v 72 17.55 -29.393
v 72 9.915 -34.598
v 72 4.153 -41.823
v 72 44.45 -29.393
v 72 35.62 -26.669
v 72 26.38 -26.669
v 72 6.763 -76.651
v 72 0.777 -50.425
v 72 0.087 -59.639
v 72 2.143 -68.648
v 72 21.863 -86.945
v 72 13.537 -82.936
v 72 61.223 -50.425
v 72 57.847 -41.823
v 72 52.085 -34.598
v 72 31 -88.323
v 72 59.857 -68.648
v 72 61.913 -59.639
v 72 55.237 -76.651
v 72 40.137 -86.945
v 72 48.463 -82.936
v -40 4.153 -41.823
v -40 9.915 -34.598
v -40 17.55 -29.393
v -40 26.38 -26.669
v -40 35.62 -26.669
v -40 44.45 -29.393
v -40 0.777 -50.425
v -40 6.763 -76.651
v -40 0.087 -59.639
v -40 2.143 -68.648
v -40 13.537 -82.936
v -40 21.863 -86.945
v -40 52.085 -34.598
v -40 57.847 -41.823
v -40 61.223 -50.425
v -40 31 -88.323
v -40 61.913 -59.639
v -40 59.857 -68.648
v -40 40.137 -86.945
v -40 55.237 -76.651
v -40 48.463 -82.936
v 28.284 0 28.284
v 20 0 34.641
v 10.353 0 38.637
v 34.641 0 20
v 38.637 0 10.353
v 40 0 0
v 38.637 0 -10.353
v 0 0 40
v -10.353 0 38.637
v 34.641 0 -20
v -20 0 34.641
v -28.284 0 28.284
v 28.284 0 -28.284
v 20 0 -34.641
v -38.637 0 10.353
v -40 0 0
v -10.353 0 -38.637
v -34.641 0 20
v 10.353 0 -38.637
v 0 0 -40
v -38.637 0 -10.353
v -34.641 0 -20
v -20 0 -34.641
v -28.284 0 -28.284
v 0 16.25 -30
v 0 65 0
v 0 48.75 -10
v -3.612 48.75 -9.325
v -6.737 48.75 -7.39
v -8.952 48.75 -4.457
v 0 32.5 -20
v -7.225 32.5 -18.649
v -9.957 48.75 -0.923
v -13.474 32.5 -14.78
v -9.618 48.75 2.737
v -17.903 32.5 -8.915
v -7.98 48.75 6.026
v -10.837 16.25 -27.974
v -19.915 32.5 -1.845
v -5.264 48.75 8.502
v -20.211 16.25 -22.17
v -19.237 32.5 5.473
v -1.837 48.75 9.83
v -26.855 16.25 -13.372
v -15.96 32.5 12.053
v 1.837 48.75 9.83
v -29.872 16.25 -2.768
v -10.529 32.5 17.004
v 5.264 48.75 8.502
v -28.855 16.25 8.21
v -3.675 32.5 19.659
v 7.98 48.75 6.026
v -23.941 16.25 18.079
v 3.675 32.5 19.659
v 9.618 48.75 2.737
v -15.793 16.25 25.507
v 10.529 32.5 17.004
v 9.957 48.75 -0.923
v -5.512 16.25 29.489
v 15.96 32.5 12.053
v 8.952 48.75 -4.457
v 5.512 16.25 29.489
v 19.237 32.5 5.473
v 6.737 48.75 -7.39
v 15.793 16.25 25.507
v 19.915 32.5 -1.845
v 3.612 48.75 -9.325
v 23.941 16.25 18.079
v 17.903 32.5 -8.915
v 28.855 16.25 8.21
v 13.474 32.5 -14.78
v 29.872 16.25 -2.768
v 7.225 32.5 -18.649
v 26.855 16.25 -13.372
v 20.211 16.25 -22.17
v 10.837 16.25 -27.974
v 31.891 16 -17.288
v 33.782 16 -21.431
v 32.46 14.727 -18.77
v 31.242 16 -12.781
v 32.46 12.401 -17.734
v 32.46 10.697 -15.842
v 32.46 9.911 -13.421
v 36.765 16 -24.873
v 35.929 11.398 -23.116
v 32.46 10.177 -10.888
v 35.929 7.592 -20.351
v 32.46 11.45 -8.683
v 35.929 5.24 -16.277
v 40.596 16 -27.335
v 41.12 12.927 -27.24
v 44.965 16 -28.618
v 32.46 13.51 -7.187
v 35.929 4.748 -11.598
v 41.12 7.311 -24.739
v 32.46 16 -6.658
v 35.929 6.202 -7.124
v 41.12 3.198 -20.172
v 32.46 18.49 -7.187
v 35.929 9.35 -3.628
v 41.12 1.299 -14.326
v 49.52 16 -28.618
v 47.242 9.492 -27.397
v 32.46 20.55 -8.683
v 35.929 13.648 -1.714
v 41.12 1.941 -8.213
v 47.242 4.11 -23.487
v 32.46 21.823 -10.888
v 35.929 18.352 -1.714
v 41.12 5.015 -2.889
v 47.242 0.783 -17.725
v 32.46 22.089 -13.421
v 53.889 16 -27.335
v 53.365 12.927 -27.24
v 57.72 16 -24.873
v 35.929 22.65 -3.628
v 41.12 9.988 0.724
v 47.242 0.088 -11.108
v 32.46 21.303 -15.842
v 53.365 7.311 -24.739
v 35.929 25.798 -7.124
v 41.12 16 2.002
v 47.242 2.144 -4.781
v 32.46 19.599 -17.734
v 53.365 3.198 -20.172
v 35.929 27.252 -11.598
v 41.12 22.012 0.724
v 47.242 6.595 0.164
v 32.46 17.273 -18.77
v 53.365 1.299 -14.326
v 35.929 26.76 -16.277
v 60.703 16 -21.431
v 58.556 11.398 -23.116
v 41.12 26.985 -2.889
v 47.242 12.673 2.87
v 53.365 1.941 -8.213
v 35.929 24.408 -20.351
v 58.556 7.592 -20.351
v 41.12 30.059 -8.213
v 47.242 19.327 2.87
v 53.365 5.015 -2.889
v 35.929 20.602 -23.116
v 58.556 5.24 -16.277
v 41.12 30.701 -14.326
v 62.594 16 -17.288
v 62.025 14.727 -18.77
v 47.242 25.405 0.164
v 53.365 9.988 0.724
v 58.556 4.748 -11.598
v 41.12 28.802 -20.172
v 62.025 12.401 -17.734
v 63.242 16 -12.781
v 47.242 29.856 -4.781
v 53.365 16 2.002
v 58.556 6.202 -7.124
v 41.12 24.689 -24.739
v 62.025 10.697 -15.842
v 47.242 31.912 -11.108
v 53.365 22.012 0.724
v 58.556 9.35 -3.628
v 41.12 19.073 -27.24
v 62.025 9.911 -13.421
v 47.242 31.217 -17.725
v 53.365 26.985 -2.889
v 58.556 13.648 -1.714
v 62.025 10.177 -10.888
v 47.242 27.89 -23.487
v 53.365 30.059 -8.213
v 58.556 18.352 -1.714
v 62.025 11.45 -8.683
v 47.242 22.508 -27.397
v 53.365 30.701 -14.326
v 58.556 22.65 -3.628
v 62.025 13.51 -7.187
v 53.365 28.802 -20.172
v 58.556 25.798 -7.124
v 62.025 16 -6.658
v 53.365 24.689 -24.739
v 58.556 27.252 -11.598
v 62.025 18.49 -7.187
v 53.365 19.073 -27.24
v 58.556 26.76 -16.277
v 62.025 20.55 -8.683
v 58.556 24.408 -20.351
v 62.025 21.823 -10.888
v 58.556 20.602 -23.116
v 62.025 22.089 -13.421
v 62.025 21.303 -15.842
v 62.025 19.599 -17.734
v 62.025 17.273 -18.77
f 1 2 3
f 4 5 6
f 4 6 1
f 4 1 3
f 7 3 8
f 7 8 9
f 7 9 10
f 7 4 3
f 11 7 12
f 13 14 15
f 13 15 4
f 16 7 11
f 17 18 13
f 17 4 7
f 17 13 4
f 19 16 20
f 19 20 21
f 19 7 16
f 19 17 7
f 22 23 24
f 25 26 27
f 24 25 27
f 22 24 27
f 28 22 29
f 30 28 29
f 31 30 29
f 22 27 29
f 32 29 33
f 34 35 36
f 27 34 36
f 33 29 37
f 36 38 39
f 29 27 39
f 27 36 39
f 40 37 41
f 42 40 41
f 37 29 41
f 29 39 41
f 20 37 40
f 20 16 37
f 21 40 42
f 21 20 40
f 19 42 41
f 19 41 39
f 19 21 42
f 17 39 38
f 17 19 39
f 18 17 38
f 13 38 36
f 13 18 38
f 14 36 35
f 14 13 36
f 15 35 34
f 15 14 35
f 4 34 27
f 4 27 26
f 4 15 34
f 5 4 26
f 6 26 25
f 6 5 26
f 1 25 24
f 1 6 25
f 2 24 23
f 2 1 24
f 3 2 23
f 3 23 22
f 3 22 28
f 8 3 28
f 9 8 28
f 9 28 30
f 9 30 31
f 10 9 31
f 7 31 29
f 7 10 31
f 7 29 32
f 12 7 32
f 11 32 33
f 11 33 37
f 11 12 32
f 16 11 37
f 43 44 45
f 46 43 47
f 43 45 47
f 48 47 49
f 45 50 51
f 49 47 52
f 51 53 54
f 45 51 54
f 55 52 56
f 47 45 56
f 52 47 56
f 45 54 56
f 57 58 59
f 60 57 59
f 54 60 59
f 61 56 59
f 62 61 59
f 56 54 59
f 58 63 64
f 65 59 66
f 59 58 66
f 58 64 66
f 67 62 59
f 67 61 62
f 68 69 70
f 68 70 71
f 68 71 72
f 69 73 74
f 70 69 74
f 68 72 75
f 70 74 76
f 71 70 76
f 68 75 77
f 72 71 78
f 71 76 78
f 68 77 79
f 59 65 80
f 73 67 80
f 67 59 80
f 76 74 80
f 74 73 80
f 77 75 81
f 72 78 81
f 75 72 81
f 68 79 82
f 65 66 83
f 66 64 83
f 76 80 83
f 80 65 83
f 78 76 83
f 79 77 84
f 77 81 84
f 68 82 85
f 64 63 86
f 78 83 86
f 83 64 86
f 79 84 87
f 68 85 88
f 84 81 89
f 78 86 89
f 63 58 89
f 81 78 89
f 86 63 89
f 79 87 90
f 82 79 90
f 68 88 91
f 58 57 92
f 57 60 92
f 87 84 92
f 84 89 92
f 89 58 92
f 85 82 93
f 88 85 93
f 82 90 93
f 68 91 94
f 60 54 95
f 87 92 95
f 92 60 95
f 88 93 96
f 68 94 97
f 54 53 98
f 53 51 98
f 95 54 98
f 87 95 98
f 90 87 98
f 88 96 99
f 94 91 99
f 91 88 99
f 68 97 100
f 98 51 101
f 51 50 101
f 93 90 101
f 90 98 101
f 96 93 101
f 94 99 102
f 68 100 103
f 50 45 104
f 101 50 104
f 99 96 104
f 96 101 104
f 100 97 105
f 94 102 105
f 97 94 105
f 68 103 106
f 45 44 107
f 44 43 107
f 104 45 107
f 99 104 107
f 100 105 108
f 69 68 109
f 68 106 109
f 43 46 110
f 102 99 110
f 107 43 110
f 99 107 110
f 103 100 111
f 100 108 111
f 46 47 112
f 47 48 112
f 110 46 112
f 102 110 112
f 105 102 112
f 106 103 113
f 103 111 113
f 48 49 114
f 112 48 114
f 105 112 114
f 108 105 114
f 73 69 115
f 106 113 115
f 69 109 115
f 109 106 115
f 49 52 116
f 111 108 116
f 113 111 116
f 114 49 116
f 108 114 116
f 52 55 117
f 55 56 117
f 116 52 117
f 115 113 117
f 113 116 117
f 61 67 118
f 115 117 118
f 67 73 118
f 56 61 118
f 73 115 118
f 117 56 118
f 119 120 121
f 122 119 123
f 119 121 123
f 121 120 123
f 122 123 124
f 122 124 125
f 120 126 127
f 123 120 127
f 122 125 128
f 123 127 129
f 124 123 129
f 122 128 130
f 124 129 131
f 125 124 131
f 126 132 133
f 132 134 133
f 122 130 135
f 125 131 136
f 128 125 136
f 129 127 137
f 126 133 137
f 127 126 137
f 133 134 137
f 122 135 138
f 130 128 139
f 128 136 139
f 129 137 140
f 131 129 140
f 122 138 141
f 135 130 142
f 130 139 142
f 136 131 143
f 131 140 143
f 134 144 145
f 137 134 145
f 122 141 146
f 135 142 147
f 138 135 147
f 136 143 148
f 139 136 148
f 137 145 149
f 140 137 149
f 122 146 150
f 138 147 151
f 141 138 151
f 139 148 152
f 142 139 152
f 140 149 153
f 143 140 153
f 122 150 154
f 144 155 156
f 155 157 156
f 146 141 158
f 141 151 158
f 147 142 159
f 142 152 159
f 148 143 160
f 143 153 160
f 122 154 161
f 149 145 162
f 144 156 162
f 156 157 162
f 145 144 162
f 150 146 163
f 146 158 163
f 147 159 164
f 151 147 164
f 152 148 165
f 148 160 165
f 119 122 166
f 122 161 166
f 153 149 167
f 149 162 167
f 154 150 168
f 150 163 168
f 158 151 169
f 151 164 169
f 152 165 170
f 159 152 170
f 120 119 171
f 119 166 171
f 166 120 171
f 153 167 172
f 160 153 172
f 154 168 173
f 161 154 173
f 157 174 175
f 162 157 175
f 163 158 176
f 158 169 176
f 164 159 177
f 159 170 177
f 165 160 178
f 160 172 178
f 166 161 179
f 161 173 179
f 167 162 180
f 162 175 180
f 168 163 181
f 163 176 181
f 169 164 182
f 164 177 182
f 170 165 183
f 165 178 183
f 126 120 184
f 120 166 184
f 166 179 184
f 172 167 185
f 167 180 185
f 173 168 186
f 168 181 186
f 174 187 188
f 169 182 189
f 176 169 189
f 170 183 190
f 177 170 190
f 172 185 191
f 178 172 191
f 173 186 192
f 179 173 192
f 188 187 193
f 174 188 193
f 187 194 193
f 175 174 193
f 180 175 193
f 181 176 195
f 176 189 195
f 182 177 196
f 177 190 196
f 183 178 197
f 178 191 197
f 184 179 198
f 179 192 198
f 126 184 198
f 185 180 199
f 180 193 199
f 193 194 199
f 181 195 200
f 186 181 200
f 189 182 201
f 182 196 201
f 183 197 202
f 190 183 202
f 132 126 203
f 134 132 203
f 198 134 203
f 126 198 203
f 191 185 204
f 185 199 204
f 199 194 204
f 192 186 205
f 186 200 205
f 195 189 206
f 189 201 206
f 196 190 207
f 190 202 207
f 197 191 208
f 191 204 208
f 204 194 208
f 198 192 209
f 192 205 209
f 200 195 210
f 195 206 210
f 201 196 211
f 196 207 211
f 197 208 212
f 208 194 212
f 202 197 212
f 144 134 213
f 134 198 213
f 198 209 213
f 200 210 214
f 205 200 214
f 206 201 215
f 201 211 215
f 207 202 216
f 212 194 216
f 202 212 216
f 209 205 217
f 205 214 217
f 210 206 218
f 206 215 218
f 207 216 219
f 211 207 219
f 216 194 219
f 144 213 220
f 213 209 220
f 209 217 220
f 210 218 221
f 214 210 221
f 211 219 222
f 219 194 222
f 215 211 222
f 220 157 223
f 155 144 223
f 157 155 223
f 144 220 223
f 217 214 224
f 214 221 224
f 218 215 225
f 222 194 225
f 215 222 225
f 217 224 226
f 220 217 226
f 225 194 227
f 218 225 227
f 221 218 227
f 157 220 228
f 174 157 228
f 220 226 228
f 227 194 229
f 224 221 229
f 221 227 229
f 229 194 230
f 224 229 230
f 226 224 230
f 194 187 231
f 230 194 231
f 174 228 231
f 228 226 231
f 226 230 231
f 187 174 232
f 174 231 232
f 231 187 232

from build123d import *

# Parameters (mm, degrees)
SKETCH2_R           = 31
EXTRUDE1_DEPTH      = 72
EXTRUDE1_DEPTH_BACK = 40


with BuildPart() as part:
    # Sketch1 → Revolve1 (revolve)
    with BuildSketch(Plane.XY, mode=Mode.PRIVATE) as revolve1_sk:
        Polygon((40, 0), (0, 0), (0, 65), align=None)
    revolve(revolve1_sk.sketch.rotate(Axis((0, 0, 0), (0, 1, 0)), 90), axis=Axis((0, 0, 0), (0, 1, 0)))  # turned: the seam where the file's is


with BuildPart() as body_2:
    # Sketch2 → Extrude1 (new body, two sides)
    with BuildSketch(Plane(origin=(0, 0, 0), x_dir=(0, 0, -1), z_dir=(1, 0, 0))) as extrude1_sk:
        with Locations((57.322651015, 31)):
            Circle(SKETCH2_R)
    extrude(amount=EXTRUDE1_DEPTH)
    extrude(extrude1_sk.sketch, amount=-EXTRUDE1_DEPTH_BACK)


with BuildPart() as body_3:
    # Sketch6 → Revolve2 (revolve)
    with BuildSketch(Plane(origin=(0, 16, 0), x_dir=(-1, 0, 0), z_dir=(0, 1, 0))):
        with BuildLine():
            Line((-63.24248379, -12.780536112), (-31.24248379, -12.780536112))
            ThreePointArc((-31.24248379, -12.780536112), (-47.24248379, -28.780536112), (-63.24248379, -12.780536112))
        make_face()
    revolve(axis=Axis((63.24248379, 16, -12.780536112), (-1, 0, 0)))


solid = Compound([part.part, body_2.part, body_3.part])
